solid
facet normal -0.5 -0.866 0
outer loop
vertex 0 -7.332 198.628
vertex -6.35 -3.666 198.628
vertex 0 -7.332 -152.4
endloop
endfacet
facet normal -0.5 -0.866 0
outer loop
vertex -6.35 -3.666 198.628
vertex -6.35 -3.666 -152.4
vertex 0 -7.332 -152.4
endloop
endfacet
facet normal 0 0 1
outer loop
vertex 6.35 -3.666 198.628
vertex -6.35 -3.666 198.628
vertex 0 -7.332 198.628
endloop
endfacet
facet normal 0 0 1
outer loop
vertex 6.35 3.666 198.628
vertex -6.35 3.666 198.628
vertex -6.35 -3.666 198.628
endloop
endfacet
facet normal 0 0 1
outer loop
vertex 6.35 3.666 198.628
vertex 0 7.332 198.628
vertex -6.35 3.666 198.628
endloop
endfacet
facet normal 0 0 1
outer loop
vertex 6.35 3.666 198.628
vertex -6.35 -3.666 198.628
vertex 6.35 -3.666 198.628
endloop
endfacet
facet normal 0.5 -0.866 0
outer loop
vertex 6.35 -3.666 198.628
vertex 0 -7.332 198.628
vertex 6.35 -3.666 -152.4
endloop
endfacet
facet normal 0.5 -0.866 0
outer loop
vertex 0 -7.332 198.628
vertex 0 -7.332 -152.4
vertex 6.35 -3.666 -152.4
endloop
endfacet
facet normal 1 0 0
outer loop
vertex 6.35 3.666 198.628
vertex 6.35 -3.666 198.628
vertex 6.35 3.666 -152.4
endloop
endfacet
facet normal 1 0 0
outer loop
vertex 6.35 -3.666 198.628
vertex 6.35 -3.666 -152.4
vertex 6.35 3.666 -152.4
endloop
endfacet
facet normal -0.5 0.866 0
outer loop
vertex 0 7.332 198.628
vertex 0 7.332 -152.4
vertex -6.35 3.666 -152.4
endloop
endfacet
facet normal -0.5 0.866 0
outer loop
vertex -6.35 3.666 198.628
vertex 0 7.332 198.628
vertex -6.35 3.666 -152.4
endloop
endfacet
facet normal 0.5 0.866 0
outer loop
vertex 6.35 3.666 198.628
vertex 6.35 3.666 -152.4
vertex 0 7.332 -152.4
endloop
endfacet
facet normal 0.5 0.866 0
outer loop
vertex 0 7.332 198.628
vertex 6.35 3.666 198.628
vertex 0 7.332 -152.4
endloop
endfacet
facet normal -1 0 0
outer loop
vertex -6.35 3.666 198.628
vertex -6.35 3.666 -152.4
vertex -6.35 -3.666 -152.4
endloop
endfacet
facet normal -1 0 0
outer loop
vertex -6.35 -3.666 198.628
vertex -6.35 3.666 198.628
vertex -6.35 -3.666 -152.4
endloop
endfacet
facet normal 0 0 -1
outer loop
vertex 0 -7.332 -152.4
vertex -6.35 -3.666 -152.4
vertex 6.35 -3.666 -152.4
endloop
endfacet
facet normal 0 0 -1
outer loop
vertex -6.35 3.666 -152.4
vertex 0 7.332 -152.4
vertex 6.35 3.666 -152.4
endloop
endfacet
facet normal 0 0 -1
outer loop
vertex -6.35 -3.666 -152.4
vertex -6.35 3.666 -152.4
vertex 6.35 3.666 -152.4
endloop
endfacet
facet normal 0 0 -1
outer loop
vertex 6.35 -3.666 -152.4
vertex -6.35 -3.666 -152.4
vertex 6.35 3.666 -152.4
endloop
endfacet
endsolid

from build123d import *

# Parameters (mm, degrees)
BOSS_EXTRUDE2_DEPTH      = 152.4
BOSS_EXTRUDE2_DEPTH_BACK = 152.4
BOSS_EXTRUDE3_DEPTH      = 46.228


with BuildPart() as part:
    # Sketch3 → Boss-Extrude2 (new, two sides: drawn at the far end of the back side and taken through both)
    with BuildSketch(Plane.XY.offset(-BOSS_EXTRUDE2_DEPTH_BACK)):
        Polygon((-6.35, -3.666174209), (0, -7.332348419), (6.35, -3.666174209), (6.35, 3.666174209), (0, 7.332348419), (-6.35, 3.666174209), align=None)
    extrude(amount=BOSS_EXTRUDE2_DEPTH + BOSS_EXTRUDE2_DEPTH_BACK)

    # Sketch4 → Boss-Extrude3 (add)
    with BuildSketch(Plane.XY.offset(152.4)):
        Polygon((-6.35, 3.666174209), (-6.35, -3.666174209), (0, -7.332348419), (6.35, -3.666174209), (6.35, 3.666174209), (0, 7.332348419), align=None)
    extrude(amount=BOSS_EXTRUDE3_DEPTH)


solid = part.part
